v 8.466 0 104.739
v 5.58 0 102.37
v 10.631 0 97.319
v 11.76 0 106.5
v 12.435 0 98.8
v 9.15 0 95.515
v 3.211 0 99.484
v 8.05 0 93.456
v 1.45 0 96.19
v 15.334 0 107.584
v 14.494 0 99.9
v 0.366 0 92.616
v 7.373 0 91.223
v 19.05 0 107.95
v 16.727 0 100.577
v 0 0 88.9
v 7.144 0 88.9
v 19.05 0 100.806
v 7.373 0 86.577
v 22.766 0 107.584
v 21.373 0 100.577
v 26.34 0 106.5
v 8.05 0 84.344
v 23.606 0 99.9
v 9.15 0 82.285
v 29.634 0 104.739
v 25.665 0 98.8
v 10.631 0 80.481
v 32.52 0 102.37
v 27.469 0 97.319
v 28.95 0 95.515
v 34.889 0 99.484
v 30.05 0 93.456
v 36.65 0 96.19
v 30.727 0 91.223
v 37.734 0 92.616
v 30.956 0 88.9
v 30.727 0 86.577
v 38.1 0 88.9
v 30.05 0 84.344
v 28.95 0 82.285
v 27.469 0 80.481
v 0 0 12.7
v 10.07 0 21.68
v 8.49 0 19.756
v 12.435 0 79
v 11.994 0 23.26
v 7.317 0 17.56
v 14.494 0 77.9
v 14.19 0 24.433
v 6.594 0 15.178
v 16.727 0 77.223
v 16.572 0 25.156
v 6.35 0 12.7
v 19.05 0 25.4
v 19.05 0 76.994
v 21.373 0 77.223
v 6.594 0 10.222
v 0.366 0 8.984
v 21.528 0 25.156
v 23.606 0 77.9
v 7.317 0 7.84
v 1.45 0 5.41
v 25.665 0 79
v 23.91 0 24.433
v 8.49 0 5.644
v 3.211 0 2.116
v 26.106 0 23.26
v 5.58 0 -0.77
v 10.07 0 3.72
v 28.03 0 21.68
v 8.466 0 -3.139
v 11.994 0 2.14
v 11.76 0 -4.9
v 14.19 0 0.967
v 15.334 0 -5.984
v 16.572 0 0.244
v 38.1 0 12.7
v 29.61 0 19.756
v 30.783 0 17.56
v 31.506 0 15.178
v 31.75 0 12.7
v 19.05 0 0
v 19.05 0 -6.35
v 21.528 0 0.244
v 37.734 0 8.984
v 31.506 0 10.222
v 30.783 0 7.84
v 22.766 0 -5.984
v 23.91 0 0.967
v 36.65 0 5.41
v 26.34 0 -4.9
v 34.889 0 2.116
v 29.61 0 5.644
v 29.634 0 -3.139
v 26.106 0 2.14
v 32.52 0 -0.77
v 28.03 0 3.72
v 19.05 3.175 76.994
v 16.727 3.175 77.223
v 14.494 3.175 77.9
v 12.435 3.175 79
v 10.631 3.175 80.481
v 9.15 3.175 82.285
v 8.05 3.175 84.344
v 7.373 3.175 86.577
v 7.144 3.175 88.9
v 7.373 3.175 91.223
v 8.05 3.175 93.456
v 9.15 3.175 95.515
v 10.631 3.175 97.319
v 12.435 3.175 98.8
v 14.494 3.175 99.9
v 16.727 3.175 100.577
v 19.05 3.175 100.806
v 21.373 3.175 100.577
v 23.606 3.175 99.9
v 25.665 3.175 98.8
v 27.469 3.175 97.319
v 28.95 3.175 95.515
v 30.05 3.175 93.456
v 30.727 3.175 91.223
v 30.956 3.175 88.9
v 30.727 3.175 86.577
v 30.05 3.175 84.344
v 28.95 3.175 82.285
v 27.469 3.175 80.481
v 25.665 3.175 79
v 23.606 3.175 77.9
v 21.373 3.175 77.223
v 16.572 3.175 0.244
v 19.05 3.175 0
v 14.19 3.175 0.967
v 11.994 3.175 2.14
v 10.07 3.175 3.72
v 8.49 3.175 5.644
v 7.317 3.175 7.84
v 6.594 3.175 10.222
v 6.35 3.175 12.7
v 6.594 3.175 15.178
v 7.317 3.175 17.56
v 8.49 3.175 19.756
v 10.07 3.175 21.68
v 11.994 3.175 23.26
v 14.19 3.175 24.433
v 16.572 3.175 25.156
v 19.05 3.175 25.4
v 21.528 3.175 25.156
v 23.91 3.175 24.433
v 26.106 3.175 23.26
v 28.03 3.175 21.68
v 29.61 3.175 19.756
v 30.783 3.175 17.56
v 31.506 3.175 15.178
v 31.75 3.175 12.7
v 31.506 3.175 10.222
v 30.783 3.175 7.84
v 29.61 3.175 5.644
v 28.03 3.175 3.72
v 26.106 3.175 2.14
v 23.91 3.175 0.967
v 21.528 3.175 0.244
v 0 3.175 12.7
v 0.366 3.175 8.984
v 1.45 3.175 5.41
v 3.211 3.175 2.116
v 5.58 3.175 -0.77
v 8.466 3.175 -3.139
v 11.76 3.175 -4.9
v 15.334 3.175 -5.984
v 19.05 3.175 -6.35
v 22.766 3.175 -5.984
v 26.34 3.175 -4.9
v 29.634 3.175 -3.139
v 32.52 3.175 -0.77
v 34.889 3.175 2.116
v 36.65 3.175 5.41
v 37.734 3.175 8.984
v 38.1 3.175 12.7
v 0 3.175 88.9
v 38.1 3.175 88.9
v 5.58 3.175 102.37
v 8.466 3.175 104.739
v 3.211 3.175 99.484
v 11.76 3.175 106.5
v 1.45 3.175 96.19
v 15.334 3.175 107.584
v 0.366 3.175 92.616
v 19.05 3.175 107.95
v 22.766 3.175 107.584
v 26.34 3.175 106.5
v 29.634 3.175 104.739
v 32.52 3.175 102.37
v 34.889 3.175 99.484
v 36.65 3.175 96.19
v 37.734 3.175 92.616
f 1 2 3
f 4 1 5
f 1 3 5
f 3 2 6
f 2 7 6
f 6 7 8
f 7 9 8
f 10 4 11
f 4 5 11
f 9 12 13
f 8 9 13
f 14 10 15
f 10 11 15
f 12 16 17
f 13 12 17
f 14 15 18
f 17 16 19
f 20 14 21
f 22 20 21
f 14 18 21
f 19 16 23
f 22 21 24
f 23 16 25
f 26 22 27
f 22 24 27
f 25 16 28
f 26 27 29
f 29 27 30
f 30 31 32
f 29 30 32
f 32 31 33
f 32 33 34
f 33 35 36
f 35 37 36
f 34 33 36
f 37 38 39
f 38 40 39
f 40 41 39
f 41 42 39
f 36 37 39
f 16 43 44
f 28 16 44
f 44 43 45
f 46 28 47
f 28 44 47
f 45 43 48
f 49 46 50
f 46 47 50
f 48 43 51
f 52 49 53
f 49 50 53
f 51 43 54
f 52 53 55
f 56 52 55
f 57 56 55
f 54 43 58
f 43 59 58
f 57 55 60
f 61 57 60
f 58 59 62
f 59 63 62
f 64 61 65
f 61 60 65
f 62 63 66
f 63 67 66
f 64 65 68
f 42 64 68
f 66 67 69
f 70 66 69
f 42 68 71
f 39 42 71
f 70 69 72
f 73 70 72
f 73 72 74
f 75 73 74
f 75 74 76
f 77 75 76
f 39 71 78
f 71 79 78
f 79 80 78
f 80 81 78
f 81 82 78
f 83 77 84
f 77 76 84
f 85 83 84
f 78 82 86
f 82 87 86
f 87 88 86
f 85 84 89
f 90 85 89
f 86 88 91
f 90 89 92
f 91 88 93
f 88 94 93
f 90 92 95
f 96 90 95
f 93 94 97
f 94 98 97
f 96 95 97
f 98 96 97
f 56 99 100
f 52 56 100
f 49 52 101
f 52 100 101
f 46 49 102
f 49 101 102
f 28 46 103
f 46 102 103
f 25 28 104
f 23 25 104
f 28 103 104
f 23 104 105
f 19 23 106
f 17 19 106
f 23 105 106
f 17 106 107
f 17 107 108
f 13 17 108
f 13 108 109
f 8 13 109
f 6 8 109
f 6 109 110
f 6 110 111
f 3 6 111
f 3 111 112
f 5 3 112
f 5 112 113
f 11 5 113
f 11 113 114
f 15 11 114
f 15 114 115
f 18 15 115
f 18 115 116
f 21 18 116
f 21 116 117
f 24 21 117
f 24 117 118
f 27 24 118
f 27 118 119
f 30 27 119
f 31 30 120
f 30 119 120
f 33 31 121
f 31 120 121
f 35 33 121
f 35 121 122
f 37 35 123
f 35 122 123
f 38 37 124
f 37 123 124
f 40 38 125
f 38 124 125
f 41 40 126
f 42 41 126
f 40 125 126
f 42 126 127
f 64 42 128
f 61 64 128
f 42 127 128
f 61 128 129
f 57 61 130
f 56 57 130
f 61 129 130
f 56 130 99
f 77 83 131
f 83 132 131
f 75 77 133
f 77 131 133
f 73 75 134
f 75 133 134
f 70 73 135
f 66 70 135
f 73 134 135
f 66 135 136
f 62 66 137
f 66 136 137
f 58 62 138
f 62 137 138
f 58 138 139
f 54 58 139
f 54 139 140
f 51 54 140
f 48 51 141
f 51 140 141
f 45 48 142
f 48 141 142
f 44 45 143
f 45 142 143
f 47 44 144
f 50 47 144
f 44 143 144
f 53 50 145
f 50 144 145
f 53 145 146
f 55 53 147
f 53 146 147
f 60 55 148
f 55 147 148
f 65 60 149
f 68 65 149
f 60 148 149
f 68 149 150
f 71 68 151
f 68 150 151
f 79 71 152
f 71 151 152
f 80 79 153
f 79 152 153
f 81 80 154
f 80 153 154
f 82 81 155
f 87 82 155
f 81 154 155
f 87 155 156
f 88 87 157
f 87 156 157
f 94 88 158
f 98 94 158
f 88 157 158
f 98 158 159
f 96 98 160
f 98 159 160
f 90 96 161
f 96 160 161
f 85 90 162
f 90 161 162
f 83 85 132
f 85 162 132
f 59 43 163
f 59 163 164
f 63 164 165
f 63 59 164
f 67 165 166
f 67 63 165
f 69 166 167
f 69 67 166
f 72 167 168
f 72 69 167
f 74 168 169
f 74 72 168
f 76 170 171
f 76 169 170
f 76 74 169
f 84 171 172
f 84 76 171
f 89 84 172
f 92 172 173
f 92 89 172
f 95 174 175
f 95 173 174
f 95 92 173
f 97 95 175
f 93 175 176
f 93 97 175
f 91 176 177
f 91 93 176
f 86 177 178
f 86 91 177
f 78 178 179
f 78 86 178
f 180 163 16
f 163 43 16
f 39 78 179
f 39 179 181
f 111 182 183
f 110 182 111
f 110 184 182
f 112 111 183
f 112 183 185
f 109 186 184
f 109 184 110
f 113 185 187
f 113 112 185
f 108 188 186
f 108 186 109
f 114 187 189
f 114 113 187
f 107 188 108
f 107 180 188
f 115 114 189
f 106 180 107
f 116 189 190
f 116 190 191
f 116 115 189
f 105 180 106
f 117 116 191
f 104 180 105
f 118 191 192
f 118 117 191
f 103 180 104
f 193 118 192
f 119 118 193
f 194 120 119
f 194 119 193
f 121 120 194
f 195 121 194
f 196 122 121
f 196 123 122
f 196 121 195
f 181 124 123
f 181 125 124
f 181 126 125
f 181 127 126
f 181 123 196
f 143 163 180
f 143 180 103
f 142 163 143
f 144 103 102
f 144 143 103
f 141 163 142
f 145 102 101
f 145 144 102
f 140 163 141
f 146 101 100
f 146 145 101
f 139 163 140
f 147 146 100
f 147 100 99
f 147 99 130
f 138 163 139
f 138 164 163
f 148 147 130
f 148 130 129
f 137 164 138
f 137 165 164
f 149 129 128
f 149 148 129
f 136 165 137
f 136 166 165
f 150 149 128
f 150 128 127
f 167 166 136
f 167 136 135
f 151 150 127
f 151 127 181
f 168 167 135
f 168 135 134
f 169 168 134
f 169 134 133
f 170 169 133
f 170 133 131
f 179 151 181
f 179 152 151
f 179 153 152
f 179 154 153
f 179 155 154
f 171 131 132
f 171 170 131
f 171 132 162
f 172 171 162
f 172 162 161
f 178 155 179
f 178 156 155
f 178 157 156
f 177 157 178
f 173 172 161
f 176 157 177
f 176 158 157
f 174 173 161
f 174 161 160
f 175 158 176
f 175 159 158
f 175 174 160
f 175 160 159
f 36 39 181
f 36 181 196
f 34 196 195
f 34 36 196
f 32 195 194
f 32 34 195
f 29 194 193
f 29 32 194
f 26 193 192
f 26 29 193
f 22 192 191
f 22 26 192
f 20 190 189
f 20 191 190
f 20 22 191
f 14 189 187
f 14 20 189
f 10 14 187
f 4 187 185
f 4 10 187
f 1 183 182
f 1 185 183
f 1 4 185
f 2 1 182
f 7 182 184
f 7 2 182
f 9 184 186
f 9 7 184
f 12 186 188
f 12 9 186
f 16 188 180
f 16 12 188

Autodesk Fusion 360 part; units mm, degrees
sketch "Sketch1" plane through (0, 0, 0) normal (0, 1, 0) x (1, 0, 0)
  arc A0 (38.1, -12.7) -> (0, -12.7) centre (19.05, -12.7) ccw
  line L0 (0, -12.7) -> (0, -88.9)
  line L1 (38.1, -12.7) -> (38.1, -88.9)
  arc A1 (0, -88.9) -> (38.1, -88.9) centre (19.05, -88.9) ccw
  dimension "d9" = 76.2
  dimension "d11" = 38.1
extrude "Extrude1" add sketch "Sketch1" along normal blind 3.175
hole "Hole1" at (19.05, 0, 88.9) direction (0, 1, 0) diameter 23.8125 end through all
hole "Hole2" at (19.05, 0, 12.7) direction (0, 1, 0) diameter 25.4 end through all
equation "L = 3 in"
equation "P = 500 lbforce"
equation "stress = 9000 psi"
equation "d_A = 0.9375 in"
equation "d_1 = 1 in"
equation "t = ceil(( P / ( d_A * stress ) ) / 0.125 in) * 0.125 in"
equation "d9 = L"
equation "d11 = w"
equation "w = 1.5 in"
equation "d13 = t"
equation "d15 = d_A"
equation "d17 = d_1"
